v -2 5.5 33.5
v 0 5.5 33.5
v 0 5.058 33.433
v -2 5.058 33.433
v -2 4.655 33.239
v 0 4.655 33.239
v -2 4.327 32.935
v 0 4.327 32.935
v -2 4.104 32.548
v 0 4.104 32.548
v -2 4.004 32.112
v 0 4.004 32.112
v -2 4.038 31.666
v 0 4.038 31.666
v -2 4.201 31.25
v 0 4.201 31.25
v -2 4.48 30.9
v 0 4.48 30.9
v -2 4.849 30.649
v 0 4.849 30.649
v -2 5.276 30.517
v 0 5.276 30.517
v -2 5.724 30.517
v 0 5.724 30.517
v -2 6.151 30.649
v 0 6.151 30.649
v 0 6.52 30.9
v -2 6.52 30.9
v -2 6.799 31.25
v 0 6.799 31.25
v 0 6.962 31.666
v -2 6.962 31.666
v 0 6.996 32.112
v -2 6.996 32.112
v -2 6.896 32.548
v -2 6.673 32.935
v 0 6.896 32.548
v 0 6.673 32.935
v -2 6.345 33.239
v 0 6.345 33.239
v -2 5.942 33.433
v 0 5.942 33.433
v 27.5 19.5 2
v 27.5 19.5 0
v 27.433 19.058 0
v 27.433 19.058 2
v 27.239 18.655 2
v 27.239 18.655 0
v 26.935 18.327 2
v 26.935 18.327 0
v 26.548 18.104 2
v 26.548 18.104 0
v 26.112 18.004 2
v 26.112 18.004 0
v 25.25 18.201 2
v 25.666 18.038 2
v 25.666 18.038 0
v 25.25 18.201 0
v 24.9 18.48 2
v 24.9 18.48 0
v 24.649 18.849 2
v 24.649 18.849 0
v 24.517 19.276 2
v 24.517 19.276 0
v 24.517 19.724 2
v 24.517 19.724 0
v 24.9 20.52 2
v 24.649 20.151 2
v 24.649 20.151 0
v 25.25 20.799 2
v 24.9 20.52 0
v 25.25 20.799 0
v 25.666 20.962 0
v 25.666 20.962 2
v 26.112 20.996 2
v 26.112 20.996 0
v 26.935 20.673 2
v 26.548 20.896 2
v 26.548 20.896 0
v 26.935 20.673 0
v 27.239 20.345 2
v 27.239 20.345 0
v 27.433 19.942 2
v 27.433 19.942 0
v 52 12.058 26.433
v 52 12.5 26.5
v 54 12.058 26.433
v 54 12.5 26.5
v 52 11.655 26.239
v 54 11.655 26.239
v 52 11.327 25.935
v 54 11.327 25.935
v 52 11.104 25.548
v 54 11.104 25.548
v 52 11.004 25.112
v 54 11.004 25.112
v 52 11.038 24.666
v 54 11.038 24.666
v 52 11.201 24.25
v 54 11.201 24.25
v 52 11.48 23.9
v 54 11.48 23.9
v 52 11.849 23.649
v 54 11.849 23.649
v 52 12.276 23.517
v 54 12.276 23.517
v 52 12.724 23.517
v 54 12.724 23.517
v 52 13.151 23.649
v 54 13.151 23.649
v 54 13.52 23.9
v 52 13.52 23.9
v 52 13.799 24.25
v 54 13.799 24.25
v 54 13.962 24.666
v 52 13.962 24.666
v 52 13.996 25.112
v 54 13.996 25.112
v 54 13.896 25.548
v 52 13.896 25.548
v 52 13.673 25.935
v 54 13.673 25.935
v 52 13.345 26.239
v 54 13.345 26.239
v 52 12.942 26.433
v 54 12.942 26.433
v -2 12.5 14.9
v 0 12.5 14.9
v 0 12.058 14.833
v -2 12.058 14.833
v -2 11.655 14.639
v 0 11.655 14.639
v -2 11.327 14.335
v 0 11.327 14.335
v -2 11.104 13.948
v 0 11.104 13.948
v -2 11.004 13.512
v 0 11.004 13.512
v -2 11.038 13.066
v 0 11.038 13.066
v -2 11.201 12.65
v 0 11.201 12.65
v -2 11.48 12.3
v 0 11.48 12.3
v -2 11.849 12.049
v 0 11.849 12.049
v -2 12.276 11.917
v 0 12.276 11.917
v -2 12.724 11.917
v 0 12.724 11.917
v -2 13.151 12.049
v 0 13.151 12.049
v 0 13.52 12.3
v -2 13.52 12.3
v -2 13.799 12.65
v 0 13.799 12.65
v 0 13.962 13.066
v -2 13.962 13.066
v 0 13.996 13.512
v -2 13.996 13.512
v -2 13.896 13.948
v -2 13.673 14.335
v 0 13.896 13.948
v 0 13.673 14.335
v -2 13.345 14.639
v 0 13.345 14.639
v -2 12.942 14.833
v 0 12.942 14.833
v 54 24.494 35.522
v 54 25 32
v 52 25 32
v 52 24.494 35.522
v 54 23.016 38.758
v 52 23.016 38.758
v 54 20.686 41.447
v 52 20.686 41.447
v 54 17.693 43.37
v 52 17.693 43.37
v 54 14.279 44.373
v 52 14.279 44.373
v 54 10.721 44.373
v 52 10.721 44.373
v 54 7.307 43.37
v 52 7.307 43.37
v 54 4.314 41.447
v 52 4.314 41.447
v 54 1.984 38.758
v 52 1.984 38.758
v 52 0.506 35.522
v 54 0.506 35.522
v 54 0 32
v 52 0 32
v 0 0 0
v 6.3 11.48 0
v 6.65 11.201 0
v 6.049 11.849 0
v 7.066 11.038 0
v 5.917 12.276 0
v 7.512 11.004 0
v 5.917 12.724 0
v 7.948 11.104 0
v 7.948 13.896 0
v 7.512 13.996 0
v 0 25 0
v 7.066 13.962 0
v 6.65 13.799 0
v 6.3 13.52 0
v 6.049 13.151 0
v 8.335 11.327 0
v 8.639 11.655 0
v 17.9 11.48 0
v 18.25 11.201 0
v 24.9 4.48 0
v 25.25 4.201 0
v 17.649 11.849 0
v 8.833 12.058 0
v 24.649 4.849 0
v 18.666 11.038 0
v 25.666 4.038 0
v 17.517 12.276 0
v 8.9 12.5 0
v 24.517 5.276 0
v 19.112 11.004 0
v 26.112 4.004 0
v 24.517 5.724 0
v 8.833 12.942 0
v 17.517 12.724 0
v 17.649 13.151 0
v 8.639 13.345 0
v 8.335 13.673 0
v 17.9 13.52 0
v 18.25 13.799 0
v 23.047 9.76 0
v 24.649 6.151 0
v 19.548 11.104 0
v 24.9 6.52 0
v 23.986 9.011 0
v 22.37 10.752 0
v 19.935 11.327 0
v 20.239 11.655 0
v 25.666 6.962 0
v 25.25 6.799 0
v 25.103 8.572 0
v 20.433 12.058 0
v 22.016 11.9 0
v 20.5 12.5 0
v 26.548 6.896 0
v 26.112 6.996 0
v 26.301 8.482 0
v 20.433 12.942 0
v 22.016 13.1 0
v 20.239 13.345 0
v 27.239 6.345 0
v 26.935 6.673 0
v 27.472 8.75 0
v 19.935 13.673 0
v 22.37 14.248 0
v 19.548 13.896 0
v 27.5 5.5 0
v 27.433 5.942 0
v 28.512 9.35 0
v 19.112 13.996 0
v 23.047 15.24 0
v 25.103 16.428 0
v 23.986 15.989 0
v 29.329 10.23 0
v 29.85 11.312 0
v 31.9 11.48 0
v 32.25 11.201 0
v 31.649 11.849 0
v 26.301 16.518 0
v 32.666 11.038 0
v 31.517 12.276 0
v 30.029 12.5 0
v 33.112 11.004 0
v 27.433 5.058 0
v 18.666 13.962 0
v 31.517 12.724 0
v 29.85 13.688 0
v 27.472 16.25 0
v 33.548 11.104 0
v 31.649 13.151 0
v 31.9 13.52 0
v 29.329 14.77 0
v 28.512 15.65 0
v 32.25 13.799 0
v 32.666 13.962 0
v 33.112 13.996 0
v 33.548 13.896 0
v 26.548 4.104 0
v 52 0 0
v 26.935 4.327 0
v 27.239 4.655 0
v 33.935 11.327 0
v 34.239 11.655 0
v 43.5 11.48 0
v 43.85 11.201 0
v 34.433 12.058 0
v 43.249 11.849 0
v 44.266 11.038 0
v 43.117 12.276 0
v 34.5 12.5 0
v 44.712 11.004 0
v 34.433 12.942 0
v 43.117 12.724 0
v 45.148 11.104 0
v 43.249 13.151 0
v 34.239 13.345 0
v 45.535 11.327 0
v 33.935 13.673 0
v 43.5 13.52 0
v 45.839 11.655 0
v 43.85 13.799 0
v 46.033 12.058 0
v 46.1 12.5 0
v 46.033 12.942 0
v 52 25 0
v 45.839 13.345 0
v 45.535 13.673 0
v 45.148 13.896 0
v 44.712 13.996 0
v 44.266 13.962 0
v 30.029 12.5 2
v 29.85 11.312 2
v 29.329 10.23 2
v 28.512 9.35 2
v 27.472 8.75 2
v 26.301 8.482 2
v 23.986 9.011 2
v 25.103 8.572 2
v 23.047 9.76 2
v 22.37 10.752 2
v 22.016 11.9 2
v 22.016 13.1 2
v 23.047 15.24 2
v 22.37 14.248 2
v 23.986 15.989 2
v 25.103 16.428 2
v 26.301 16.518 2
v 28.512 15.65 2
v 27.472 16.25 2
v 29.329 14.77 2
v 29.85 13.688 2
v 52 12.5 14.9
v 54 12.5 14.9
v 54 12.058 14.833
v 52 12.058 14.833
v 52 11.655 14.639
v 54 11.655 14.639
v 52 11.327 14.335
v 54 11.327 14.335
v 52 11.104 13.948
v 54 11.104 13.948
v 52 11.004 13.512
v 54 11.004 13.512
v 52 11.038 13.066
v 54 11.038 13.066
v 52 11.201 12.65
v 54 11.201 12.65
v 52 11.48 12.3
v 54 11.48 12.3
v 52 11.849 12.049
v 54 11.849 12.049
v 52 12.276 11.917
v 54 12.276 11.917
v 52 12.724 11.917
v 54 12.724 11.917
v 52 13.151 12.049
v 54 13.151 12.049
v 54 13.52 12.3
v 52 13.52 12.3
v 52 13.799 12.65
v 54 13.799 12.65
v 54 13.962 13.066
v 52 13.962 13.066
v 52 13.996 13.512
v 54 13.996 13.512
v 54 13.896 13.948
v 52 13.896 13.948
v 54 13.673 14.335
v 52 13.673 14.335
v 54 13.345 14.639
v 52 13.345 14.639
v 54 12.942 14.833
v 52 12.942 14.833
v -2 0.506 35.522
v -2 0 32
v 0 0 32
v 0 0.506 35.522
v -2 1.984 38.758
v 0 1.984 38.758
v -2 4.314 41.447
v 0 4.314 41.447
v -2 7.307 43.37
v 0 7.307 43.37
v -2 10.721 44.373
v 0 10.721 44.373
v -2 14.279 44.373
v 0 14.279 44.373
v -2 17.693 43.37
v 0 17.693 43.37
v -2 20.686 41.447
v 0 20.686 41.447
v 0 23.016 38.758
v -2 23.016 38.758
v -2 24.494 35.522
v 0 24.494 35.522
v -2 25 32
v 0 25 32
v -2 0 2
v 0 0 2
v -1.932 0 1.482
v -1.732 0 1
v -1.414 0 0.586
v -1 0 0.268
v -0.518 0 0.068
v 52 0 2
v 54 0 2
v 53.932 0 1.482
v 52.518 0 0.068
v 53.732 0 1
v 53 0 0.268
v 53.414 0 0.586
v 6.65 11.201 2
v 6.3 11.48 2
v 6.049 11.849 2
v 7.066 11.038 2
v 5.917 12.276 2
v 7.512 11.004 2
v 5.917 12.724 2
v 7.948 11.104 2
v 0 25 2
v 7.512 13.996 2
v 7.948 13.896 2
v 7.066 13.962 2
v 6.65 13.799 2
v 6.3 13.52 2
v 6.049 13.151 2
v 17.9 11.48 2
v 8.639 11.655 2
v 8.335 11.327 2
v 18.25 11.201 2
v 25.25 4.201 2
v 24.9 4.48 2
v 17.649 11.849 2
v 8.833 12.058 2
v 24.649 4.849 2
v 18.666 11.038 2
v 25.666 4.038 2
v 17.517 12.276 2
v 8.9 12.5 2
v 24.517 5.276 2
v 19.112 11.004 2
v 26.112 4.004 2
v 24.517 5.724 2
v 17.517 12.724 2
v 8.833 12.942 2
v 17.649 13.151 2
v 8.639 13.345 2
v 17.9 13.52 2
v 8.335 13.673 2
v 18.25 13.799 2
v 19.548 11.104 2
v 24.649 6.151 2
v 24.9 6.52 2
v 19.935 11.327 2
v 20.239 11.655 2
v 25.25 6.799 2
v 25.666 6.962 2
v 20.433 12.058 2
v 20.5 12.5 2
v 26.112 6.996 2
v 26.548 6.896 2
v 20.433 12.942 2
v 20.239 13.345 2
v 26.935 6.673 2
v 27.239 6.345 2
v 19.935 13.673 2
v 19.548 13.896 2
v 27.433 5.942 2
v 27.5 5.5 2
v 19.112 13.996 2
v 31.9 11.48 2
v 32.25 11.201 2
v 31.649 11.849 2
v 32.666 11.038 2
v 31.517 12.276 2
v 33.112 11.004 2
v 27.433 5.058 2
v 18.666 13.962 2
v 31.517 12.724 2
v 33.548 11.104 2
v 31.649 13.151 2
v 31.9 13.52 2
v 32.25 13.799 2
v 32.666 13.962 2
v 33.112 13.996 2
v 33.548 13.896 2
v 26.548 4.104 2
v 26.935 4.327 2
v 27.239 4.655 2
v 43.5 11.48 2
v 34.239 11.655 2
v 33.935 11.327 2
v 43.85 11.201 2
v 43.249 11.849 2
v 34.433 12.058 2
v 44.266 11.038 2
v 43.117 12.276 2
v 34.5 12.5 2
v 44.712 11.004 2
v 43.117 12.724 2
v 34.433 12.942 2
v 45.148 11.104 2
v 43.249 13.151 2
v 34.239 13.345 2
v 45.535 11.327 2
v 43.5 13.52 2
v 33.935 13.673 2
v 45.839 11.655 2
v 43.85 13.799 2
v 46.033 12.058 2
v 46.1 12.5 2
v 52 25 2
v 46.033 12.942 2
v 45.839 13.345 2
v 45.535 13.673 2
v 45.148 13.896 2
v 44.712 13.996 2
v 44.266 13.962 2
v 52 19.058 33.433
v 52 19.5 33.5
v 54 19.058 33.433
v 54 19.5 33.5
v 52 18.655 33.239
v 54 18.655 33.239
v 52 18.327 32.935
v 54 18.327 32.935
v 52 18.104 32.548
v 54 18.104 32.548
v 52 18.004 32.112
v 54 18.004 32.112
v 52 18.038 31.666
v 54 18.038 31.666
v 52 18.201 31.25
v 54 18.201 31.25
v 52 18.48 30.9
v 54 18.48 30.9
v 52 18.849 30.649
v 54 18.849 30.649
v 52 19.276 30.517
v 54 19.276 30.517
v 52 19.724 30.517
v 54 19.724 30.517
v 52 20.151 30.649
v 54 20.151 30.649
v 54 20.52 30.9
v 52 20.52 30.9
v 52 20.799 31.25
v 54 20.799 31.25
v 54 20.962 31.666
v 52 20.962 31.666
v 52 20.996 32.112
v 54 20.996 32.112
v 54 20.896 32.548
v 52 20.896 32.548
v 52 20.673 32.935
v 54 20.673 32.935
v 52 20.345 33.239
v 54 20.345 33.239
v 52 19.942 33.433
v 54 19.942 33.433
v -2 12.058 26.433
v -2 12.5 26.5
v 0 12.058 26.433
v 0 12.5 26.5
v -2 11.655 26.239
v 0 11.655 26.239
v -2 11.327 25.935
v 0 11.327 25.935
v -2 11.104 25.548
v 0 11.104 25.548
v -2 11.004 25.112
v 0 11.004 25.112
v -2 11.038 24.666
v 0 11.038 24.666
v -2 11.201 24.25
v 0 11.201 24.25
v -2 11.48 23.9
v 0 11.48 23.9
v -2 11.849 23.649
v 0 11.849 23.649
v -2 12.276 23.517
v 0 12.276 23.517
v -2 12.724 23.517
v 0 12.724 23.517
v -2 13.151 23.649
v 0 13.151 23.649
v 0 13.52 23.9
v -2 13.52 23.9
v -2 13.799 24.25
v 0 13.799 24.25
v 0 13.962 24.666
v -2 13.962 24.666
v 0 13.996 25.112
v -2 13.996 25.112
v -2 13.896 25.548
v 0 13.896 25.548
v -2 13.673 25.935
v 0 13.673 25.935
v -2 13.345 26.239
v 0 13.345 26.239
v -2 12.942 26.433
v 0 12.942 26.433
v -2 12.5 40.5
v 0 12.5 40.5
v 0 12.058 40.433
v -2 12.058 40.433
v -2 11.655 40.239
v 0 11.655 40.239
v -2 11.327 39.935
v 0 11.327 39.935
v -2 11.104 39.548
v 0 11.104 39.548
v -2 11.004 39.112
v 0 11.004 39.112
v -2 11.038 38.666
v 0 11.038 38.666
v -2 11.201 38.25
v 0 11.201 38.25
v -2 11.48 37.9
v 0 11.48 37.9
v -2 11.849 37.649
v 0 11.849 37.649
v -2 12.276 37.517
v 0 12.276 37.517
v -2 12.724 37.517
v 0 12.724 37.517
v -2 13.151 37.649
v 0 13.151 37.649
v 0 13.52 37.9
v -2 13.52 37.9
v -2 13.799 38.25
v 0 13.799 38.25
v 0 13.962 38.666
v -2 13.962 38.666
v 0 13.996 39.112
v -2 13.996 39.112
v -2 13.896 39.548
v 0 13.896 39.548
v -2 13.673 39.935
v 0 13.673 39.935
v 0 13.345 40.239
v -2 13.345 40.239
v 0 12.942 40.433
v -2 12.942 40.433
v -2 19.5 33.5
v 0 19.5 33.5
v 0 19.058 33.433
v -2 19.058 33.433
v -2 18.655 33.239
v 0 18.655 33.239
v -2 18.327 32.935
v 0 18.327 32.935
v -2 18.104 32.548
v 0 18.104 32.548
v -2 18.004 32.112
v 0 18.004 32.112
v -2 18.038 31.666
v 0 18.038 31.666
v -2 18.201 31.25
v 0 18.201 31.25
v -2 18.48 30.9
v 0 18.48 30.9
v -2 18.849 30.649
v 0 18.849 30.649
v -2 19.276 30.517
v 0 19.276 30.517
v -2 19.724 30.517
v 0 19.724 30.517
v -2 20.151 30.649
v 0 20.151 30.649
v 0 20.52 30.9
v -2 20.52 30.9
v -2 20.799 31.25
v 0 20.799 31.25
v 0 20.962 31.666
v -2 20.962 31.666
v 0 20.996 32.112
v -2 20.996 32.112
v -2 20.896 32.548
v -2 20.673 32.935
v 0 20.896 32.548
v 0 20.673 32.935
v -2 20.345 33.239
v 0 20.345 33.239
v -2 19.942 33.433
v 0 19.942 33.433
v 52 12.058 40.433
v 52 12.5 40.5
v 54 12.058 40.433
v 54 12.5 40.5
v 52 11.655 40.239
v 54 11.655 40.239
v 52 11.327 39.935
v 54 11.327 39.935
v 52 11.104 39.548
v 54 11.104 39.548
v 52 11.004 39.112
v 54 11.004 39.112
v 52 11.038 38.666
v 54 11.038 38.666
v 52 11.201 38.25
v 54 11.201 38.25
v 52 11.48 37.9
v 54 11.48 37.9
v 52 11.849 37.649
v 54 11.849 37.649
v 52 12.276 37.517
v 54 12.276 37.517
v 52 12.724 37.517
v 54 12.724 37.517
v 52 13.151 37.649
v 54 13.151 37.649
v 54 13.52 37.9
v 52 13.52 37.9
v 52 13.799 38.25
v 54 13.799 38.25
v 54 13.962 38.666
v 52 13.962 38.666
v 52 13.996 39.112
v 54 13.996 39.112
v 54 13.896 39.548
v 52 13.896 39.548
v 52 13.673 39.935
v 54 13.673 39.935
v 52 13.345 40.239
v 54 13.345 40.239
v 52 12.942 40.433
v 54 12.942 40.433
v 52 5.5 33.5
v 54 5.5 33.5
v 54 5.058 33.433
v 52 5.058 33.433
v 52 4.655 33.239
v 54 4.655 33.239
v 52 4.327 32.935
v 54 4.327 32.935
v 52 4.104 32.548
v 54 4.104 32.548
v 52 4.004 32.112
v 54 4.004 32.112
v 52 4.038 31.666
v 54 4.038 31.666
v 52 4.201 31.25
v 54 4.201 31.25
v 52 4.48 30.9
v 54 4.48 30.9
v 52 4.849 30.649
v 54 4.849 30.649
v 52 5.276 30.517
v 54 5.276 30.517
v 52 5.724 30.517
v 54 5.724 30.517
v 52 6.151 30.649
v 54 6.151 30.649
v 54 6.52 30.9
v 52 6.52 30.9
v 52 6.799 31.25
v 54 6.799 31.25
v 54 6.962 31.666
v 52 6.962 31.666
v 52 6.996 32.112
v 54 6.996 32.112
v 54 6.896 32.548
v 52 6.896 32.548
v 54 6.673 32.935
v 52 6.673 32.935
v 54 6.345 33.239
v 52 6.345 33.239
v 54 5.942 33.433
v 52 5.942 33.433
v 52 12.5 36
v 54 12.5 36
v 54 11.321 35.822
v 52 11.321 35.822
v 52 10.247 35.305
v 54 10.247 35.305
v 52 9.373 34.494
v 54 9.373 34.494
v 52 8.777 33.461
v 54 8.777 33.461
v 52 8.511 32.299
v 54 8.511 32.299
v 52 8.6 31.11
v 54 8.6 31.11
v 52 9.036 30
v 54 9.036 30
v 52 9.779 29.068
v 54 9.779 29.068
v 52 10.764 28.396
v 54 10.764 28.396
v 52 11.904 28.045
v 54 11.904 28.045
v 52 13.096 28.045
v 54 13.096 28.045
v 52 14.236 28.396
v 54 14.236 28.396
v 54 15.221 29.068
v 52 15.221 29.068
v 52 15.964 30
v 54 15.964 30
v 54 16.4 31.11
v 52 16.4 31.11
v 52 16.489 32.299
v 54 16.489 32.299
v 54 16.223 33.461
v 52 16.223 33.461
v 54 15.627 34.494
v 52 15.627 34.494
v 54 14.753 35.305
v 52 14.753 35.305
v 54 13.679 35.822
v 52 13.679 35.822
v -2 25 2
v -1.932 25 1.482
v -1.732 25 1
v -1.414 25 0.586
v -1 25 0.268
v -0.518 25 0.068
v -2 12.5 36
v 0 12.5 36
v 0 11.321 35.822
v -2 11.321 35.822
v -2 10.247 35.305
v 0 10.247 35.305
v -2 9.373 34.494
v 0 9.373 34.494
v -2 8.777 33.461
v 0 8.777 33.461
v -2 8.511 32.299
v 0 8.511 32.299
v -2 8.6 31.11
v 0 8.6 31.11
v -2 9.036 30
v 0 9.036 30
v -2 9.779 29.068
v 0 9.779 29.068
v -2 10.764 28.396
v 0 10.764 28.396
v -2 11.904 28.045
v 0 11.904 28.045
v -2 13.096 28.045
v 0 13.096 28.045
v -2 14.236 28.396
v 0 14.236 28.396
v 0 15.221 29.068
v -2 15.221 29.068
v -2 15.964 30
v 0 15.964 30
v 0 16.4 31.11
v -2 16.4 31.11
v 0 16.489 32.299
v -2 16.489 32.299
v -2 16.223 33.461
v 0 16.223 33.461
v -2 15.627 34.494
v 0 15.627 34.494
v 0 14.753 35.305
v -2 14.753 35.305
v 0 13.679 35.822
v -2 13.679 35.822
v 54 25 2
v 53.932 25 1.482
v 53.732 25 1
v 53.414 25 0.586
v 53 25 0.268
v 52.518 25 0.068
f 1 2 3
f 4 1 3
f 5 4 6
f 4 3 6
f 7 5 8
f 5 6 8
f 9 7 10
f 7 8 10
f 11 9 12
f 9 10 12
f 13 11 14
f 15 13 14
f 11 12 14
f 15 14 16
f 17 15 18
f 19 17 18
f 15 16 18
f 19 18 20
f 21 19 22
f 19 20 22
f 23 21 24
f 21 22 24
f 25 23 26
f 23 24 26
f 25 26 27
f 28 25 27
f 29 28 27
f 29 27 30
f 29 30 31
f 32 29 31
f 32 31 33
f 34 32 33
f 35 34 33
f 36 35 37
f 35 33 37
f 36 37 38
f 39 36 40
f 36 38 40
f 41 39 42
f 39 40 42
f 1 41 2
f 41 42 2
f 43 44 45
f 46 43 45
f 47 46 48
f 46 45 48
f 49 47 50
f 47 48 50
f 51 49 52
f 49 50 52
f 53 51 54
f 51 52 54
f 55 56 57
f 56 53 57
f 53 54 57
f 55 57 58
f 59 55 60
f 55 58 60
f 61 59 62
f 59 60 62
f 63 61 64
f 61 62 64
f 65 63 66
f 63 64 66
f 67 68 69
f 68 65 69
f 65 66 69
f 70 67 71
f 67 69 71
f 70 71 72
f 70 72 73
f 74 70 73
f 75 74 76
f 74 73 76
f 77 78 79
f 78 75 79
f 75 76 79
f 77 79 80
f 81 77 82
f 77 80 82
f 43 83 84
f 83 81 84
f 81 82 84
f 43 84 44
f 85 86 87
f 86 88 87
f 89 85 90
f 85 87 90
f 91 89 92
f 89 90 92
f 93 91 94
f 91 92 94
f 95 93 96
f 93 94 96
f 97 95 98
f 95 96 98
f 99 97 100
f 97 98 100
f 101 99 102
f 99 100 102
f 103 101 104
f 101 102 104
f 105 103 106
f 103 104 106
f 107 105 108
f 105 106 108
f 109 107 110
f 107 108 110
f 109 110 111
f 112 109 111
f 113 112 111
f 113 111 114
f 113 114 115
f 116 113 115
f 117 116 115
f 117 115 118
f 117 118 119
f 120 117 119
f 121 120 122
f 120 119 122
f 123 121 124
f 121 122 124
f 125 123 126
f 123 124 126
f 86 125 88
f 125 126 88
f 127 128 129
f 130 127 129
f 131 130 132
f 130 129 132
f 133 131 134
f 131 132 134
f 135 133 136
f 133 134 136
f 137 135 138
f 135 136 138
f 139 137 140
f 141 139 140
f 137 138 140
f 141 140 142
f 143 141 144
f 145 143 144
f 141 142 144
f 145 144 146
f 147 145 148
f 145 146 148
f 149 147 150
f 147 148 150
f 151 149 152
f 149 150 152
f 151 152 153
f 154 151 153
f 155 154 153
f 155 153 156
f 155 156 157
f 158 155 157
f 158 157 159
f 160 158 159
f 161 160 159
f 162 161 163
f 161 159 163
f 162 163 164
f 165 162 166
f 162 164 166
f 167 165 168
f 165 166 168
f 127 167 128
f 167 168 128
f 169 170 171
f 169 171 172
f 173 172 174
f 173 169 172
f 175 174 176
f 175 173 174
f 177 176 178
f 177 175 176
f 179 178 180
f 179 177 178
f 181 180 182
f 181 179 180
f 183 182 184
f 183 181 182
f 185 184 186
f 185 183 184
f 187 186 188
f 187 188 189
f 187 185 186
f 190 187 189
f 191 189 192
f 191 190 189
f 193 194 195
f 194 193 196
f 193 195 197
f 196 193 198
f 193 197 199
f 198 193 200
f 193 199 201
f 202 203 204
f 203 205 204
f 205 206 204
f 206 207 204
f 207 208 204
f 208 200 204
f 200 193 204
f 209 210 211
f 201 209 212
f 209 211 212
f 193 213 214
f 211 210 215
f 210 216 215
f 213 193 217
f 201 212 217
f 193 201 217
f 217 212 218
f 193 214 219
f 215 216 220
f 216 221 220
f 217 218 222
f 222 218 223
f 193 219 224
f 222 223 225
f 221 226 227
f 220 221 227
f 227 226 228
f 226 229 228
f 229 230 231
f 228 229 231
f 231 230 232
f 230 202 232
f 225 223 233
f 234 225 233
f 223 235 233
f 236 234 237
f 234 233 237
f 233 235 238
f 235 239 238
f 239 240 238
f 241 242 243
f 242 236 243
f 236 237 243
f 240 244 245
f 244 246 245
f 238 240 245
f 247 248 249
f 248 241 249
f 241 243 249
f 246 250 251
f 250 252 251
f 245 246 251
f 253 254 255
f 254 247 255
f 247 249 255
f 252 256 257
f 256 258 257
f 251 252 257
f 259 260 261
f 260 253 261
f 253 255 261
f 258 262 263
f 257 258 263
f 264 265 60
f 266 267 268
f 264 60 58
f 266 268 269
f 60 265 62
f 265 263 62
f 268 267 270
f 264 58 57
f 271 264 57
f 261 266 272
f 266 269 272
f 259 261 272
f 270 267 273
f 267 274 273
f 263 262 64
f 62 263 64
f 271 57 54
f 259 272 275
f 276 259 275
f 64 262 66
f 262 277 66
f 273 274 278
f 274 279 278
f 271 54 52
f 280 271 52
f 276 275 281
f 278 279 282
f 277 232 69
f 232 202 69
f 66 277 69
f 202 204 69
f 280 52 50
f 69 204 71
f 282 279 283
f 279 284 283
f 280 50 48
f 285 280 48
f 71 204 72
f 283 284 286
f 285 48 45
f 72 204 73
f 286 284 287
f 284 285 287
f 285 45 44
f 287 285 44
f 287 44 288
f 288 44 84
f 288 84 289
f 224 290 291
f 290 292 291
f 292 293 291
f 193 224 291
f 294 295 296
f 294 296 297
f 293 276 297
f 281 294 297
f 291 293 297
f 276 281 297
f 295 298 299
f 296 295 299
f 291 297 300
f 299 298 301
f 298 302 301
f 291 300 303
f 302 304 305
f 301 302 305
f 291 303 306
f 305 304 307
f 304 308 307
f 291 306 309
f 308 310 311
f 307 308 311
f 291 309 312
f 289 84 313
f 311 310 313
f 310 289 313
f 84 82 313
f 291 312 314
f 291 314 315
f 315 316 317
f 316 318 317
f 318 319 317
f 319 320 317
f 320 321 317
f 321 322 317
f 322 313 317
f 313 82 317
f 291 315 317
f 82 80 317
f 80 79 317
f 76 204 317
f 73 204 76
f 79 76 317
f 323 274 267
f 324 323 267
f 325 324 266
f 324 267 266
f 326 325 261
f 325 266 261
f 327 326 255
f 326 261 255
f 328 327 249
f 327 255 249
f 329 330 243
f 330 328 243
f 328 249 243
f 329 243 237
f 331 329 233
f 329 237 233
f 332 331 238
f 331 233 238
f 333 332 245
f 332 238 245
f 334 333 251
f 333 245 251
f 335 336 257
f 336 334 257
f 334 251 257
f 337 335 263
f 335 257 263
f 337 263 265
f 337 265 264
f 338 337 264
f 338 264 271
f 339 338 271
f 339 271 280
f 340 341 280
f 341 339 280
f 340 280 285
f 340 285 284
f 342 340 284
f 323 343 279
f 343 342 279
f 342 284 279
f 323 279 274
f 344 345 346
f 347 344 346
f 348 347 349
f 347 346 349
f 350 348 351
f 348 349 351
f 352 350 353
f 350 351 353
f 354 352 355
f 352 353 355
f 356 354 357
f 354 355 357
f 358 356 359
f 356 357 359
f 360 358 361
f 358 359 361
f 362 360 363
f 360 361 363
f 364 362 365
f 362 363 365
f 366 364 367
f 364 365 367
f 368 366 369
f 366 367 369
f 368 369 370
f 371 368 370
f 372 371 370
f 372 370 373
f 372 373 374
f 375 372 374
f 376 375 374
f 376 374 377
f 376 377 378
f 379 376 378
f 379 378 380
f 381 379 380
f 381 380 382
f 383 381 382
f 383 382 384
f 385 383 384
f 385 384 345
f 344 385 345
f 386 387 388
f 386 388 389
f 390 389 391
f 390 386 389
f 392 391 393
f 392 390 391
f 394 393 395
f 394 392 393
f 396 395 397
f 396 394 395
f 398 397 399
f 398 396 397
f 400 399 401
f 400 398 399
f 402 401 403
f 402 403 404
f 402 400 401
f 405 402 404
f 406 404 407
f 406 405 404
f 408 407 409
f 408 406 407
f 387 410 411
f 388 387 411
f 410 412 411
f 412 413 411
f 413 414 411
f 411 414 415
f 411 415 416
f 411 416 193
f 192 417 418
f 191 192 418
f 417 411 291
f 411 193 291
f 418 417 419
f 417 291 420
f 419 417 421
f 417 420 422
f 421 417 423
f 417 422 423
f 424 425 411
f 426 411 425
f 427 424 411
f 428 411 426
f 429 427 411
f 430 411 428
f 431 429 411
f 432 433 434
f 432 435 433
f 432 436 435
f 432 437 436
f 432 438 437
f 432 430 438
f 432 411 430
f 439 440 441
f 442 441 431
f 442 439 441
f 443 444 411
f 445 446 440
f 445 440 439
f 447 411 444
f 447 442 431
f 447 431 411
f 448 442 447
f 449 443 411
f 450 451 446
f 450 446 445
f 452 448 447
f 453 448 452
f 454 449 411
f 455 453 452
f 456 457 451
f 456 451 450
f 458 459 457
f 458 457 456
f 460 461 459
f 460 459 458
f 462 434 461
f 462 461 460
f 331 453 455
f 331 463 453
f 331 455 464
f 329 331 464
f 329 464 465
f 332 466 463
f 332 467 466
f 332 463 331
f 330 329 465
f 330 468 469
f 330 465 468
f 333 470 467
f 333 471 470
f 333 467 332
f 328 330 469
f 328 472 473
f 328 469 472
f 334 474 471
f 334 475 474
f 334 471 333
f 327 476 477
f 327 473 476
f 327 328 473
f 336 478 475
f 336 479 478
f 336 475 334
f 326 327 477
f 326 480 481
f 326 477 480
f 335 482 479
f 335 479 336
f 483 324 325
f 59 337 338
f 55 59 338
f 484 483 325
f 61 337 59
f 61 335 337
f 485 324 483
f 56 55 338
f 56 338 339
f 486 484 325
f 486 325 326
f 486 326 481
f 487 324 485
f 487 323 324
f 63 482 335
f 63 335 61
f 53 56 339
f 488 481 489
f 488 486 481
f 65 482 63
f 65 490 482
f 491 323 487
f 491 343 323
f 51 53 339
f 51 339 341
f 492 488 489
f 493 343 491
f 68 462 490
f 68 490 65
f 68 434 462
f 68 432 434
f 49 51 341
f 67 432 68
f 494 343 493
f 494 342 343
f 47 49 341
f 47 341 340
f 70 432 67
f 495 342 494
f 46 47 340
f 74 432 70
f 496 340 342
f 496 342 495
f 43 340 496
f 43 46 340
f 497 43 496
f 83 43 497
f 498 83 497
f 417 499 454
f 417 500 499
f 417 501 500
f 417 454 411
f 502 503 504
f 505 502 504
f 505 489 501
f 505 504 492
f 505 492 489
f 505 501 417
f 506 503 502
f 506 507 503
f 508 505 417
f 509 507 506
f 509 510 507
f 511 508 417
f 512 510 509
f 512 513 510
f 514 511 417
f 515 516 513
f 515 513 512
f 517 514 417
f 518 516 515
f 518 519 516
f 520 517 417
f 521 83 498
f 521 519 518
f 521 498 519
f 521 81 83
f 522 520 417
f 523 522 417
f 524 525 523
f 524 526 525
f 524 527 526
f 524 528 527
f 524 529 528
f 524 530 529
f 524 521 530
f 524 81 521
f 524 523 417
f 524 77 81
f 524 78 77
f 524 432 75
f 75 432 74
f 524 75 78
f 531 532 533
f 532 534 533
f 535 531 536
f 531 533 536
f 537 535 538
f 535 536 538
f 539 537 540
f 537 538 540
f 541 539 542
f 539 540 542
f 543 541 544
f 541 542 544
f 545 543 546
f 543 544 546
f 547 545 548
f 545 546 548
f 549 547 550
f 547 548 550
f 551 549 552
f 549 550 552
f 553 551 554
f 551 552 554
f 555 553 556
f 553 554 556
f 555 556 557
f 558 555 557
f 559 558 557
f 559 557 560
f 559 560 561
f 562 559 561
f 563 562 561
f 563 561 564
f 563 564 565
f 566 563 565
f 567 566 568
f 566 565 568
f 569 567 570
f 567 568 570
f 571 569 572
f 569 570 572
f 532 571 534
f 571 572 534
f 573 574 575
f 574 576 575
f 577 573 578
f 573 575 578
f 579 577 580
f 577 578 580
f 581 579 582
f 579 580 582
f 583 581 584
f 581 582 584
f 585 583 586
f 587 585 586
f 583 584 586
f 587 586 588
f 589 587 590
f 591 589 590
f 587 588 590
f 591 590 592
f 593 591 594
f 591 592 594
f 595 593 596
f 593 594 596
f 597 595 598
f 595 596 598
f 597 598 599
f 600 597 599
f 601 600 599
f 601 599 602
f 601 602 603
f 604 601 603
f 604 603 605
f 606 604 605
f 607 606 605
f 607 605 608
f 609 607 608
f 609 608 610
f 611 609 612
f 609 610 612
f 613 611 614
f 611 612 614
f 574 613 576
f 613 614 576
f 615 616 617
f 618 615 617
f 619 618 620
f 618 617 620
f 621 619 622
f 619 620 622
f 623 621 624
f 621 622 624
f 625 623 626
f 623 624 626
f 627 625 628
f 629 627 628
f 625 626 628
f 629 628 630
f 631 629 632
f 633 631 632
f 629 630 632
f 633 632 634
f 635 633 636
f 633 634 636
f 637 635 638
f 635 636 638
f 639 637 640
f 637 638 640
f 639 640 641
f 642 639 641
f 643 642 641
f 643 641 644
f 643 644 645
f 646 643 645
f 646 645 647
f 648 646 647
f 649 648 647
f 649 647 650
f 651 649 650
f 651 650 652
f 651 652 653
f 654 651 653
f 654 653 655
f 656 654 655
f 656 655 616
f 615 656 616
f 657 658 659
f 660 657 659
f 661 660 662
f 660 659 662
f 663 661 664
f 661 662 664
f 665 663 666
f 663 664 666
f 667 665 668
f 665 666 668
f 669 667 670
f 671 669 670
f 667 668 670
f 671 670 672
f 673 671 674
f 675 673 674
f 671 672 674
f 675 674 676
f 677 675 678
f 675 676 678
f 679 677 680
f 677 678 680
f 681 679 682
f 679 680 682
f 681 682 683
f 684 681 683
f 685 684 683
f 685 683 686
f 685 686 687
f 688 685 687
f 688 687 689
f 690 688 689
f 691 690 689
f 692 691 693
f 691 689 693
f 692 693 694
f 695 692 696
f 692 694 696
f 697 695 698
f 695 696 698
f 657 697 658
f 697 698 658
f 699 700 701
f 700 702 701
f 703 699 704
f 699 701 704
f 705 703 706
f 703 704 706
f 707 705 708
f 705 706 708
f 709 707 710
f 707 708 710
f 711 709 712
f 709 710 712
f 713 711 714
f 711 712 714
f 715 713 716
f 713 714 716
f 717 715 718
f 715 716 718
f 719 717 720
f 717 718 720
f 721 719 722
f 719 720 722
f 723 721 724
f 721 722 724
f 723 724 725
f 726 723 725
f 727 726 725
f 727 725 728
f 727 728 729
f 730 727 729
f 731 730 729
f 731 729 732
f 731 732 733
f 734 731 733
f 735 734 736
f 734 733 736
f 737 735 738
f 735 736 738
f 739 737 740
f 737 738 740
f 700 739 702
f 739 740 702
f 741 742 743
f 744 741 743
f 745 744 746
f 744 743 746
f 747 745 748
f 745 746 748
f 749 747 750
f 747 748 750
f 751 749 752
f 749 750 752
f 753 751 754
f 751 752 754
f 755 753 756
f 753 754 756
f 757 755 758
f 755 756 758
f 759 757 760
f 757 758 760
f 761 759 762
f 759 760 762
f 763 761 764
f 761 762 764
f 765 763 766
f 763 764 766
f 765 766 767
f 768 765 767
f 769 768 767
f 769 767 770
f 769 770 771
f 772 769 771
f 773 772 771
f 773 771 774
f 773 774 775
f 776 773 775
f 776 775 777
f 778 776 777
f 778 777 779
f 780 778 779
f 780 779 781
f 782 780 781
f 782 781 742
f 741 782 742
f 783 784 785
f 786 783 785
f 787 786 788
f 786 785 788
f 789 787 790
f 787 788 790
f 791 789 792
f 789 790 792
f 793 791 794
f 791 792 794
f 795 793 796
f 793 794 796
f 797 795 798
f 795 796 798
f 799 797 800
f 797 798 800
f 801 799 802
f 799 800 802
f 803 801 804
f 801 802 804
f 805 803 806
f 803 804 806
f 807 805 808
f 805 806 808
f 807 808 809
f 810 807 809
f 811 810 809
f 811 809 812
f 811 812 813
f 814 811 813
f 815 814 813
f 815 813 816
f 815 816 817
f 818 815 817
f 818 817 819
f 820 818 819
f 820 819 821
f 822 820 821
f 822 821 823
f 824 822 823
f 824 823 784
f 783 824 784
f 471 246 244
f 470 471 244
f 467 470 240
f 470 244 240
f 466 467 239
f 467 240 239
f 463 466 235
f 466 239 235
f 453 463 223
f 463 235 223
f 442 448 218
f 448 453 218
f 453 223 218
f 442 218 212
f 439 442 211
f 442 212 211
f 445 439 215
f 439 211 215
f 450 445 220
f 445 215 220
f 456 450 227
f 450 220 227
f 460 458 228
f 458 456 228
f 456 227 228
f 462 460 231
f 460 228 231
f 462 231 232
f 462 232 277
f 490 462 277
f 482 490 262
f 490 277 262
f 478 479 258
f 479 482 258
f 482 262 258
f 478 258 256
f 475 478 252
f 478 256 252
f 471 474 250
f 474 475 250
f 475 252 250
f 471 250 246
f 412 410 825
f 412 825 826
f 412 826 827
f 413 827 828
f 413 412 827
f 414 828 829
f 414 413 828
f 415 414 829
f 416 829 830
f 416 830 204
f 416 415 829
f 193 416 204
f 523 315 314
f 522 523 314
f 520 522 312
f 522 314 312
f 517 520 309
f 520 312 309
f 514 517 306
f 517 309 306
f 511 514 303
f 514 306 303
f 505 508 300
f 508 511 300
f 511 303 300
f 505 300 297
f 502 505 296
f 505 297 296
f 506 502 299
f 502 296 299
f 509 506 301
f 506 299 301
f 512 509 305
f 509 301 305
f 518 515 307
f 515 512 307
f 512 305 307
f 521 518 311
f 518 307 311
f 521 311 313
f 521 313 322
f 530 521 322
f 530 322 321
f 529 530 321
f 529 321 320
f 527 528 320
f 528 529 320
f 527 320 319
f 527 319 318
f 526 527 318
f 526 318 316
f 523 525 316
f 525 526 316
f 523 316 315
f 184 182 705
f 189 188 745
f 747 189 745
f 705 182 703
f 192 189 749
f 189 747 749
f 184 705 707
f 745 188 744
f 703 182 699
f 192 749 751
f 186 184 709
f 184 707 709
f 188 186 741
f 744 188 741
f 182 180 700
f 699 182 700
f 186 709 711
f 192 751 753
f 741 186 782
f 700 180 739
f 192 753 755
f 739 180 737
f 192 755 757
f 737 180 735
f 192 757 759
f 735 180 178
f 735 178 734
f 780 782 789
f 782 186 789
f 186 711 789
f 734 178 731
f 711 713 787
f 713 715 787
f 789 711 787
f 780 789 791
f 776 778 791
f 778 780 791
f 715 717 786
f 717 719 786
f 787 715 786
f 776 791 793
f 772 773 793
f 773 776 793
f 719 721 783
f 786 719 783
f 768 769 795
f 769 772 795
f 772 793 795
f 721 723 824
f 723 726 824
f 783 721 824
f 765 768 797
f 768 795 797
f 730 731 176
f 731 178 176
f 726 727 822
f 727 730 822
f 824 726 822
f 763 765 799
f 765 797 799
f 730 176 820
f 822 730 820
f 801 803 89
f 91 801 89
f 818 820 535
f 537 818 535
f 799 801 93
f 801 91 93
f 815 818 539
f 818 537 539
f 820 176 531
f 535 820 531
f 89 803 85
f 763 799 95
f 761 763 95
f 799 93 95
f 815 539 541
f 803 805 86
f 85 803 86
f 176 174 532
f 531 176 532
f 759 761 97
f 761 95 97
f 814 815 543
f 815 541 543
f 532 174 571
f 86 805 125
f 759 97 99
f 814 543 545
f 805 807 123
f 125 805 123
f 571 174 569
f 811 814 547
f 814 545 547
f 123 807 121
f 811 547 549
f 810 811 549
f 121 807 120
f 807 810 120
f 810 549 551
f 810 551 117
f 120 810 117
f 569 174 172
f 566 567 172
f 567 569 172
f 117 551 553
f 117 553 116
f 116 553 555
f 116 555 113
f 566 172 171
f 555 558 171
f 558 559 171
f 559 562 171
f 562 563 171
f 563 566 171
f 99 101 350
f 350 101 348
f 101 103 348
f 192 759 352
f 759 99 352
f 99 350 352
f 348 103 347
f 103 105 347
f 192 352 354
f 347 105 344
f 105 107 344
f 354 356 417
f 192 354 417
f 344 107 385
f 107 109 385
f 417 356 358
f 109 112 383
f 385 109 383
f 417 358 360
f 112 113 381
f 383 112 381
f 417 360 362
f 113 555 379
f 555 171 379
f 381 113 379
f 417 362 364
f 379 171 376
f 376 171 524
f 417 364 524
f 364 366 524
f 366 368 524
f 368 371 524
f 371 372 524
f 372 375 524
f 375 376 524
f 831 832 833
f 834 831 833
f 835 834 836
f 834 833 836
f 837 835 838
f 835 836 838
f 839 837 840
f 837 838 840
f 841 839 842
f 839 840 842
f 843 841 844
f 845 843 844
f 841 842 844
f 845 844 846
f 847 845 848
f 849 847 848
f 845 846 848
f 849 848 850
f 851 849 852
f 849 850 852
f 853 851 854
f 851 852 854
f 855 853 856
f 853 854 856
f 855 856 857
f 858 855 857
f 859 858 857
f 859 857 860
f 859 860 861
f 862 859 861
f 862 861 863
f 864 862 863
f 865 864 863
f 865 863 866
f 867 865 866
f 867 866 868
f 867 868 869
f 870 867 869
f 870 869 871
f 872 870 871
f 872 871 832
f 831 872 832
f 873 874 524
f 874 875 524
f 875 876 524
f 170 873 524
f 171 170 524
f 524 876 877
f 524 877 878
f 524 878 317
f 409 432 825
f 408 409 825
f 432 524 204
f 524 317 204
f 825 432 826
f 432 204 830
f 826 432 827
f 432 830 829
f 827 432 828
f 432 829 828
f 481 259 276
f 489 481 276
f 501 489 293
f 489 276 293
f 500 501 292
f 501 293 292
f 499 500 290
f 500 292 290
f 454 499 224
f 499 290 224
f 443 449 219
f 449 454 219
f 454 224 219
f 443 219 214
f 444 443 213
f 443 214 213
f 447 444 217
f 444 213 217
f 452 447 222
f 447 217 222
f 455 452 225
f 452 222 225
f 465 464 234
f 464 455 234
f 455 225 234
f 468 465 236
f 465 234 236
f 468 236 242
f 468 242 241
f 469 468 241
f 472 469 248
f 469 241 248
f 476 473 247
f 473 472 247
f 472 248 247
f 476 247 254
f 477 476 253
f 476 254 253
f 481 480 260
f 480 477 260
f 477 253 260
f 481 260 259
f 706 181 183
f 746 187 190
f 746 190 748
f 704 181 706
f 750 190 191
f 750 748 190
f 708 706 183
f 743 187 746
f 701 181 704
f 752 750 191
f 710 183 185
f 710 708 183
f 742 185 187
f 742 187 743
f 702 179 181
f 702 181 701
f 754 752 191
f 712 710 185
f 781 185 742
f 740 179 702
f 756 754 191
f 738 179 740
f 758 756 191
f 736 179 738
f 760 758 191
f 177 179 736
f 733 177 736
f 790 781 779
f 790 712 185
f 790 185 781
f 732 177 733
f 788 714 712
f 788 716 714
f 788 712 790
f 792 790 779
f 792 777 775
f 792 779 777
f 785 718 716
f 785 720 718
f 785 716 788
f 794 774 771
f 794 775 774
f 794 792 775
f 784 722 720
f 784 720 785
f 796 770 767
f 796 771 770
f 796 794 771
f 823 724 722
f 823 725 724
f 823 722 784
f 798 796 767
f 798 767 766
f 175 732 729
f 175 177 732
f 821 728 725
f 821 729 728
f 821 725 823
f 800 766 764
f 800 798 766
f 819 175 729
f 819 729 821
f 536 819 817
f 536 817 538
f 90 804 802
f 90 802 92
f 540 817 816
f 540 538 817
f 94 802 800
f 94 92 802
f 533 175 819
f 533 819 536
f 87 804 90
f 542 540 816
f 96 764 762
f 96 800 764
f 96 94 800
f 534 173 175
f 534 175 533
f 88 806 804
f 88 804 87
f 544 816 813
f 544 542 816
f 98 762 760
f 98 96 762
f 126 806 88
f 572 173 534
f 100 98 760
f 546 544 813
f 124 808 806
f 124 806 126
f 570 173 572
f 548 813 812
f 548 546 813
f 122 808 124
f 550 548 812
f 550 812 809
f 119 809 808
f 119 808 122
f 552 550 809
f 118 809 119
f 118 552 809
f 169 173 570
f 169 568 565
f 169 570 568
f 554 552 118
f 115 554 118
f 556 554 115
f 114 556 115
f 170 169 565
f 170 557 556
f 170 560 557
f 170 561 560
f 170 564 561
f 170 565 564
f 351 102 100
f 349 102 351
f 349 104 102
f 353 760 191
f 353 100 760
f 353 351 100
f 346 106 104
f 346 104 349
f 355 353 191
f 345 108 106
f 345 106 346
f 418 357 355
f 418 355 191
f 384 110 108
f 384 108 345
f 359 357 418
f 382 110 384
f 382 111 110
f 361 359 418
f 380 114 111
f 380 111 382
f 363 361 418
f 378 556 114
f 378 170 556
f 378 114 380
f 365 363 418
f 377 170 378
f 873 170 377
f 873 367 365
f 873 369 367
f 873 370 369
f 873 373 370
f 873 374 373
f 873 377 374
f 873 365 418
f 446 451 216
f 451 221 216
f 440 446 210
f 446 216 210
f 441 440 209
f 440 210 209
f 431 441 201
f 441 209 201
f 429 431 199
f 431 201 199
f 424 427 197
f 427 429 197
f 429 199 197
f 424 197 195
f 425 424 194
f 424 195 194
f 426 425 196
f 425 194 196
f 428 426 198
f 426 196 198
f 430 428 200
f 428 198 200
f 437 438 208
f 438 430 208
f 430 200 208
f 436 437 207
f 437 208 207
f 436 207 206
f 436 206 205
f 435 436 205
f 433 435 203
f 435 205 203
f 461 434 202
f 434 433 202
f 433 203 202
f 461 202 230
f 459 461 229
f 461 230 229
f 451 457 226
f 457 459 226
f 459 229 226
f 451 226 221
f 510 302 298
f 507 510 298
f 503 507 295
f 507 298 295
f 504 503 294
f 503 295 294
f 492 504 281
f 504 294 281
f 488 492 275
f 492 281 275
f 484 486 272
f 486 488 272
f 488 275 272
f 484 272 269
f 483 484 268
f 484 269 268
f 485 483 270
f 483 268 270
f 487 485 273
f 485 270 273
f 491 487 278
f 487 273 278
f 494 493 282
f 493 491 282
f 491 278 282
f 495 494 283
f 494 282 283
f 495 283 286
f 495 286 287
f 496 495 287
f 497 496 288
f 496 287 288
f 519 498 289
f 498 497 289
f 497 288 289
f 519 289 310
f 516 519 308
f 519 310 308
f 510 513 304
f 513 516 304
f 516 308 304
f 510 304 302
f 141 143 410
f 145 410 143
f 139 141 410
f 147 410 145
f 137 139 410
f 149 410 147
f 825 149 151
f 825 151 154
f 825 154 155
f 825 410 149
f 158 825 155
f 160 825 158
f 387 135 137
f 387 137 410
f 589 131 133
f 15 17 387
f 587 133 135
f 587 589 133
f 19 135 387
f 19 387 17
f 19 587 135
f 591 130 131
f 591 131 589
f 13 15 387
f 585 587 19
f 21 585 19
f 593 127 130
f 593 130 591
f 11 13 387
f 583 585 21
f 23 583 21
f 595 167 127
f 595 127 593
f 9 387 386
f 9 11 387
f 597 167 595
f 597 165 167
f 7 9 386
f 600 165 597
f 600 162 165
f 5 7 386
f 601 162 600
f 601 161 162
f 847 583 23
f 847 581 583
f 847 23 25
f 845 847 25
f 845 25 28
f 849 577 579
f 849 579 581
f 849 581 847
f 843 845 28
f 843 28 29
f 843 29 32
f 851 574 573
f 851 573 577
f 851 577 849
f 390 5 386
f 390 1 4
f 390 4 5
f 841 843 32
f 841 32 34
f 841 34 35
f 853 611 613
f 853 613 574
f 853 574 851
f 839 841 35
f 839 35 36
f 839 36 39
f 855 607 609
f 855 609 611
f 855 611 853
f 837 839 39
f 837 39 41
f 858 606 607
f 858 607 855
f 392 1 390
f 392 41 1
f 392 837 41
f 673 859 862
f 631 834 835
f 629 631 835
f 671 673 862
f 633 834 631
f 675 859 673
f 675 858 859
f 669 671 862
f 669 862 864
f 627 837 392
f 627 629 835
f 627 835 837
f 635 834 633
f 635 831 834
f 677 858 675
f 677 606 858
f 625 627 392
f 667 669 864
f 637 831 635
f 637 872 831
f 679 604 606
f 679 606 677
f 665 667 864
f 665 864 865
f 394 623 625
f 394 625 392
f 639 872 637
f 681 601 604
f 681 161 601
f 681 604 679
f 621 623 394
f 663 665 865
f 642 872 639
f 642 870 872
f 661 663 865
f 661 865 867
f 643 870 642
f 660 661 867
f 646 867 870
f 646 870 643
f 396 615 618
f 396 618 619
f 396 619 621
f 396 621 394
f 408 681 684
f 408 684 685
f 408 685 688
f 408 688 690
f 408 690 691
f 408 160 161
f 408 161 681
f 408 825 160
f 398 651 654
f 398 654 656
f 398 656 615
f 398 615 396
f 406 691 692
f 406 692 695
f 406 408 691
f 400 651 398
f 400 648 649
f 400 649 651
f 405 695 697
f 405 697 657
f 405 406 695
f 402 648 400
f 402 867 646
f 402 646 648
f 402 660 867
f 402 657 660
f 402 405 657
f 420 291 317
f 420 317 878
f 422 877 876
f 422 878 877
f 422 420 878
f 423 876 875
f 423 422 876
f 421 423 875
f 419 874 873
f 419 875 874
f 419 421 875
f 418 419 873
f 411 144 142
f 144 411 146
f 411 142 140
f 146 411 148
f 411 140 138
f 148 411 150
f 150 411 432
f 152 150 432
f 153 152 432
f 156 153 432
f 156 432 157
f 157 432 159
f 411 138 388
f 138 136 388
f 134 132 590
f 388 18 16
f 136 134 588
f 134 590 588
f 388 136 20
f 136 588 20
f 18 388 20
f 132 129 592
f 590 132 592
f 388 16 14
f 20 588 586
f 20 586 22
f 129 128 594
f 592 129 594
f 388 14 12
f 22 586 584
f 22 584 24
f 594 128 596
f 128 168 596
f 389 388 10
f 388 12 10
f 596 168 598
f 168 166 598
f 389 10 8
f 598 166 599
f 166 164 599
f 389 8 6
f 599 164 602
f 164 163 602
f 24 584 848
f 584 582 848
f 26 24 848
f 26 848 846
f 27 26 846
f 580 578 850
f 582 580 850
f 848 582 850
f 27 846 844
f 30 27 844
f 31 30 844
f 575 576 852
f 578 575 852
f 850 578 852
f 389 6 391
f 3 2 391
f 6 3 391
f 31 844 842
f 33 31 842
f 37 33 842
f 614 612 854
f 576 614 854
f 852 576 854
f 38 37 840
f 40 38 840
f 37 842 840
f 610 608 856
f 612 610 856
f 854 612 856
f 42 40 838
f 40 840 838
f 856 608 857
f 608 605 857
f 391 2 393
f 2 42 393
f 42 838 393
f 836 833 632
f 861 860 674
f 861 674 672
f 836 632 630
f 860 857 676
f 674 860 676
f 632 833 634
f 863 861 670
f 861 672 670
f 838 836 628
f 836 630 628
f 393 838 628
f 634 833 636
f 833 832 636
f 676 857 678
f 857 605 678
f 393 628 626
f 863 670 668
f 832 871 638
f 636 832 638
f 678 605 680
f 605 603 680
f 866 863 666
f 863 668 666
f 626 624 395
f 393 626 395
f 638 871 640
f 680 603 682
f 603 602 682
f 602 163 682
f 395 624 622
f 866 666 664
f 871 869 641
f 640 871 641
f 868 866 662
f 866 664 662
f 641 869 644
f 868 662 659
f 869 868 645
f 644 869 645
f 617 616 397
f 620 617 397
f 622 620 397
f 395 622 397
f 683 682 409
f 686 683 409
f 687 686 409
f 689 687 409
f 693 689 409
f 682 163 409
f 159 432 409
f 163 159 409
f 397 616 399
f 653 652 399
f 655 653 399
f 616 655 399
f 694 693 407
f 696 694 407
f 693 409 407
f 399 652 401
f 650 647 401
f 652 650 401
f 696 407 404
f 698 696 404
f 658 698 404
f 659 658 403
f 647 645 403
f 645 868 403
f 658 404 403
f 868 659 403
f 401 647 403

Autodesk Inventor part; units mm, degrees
ref_plane "YZ Plane" through (0, 0, 0) normal (1, 0, 0) x (0, 1, 0)
ref_plane "XZ Plane" through (0, 0, 0) normal (0, 1, 0) x (-1, 0, 0)
ref_plane "XY Plane" through (0, 0, 0) normal (0, 0, 1) x (1, 0, 0)
sketch "Sketch1" plane through (0, 0, 0) normal (0, 0, 1) x (1, 0, 0)
  line L0 (0, 0) -> (52, 0)
  line L1 (52, 0) -> (52, 25)
  line L2 (52, 25) -> (0, 25)
  line L3 (0, 25) -> (0, 0)
  circle A0 centre (26, 19.5) radius 1.5
  circle A1 centre (19, 12.5) radius 1.5
  circle A2 centre (33, 12.5) radius 1.5
  circle A3 centre (26, 5.5) radius 1.5
  circle A4 centre (7.4, 12.5) radius 1.5
  circle A5 centre (44.6, 12.5) radius 1.5
  circle A6 centre (26, 12.5) radius 4.0289
  line L4 (52, 25) -> (54, 25)
  line L5 (54, 25) -> (54, 0)
  line L6 (54, 0) -> (52, 0)
  line L7 (52, 0) -> (52, 25)
  line L8 (0, 25) -> (-2, 25)
  line L9 (-2, 25) -> (-2, 0)
  line L10 (-2, 0) -> (0, 0)
  line L11 (0, 0) -> (0, 25)
  dimension "d0" = 52
  dimension "d1" = 25
  dimension "d2" = 3
  dimension "d3" = 3
  dimension "d4" = 3
  dimension "d5" = 3
  dimension "d6" = 3
  dimension "d7" = 3
  dimension "d9" = 7.4
  dimension "d10" = 7.4
  dimension "d11" = 26
  dimension "d13" = 2
  dimension "d14" = 2
extrude "Extrusion1" add sketch "Sketch1" along normal blind 2 contours L3 L2 L1 L0
extrude "Extrusion2" add sketch "Sketch1" along normal blind 3 contours L10 L9 L8 L3 | L1 L4 L5 L6
sketch "Sketch2" plane through (0, 0, 3) normal (0, 0, 1) x (1, 0, 0)
  line L0 (54, 25) -> (-2, 25) projected
  line L1 (0, 0) -> (0, 25) projected
  line L2 (-2, 25) -> (0, 25)
  line L3 (0, 25) -> (0, 0)
  line L4 (0, 0) -> (-2, 0)
  line L5 (-2, 0) -> (-2, 25)
  line L6 (52, 25) -> (52, 0) projected
  line L7 (54, 0) -> (54, 25) projected
  line L8 (52, 25) -> (54, 25)
  line L9 (54, 25) -> (54, 0)
  line L10 (54, 0) -> (52, 0)
  line L11 (52, 0) -> (52, 25)
extrude "Extrusion3" add sketch "Sketch2" along normal blind 29
sketch "Sketch3" plane through (54, 0, 0) normal (1, 0, 0) x (0, 0, -1)
  line L0 (-32, 0) -> (-32, 25) projected
  line L1 (-2, 25) -> (-32, 25) projected
  line L2 (-2, 0) -> (-32, 0) projected
  arc A0 (-32, 25) -> (-32, 0) centre (-32, 12.5) ccw
  line L3 (-32, 0) -> (-32, 25) projected
  point P0 (0, 0)
  dimension "d22" = 12.5
extrude "Extrusion4" add sketch "Sketch3" against normal blind 2
sketch "Sketch4" plane through (-2, 0, 0) normal (-1, 0, 0) x (0, 0, 1)
  arc A0 (32, 0) -> (32, 25) centre (32, 12.5) ccw projected
  line L0 (2, 25) -> (32, 25) projected
  arc A1 (32, 0) -> (32, 25) centre (32, 12.5) ccw
  line L1 (32, 25) -> (32, 0)
  point P0 (0, 0)
extrude "Extrusion5" add sketch "Sketch4" against normal blind 2
fillet "Fillet1" radius 2 2 edges at (54, 12.5, 0) (-2, 12.5, 0)
sketch "Sketch5" plane through (-2, 12.5, 32) normal (-1, 0, 0) x (0, 0, 1)
  circle A0 centre (0, 0) radius 4
  circle A1 centre (0, 0) radius 7
  circle A2 centre (0, 7) radius 1.5
  circle A3 centre (-7, 0) radius 1.5
  circle A4 centre (0, -7) radius 1.5
  circle A5 centre (7, 0) radius 1.5
  circle A6 centre (-18.6, 0) radius 1.3978
  point P0 (-32, -12.5)
  dimension "d29" = 14
  dimension "d28" = 8
  dimension "d32" = 360
  dimension "d34" = 3
  dimension "d35" = 18.6
hole "Hole1" at (-2, 12.5, 32) at (-2, 12.5, 25) at (-2, 19.5, 32) at (-2, 12.5, 39) at (-2, 5.5, 32) at (-2, 12.5, 13.4) direction (1, 0, 0) diameter 3 end through all
hole "Hole2" at (-2, 12.5, 32) direction (1, 0, 0) diameter 8 end through all
properties part number "Bracket U CORTO"
